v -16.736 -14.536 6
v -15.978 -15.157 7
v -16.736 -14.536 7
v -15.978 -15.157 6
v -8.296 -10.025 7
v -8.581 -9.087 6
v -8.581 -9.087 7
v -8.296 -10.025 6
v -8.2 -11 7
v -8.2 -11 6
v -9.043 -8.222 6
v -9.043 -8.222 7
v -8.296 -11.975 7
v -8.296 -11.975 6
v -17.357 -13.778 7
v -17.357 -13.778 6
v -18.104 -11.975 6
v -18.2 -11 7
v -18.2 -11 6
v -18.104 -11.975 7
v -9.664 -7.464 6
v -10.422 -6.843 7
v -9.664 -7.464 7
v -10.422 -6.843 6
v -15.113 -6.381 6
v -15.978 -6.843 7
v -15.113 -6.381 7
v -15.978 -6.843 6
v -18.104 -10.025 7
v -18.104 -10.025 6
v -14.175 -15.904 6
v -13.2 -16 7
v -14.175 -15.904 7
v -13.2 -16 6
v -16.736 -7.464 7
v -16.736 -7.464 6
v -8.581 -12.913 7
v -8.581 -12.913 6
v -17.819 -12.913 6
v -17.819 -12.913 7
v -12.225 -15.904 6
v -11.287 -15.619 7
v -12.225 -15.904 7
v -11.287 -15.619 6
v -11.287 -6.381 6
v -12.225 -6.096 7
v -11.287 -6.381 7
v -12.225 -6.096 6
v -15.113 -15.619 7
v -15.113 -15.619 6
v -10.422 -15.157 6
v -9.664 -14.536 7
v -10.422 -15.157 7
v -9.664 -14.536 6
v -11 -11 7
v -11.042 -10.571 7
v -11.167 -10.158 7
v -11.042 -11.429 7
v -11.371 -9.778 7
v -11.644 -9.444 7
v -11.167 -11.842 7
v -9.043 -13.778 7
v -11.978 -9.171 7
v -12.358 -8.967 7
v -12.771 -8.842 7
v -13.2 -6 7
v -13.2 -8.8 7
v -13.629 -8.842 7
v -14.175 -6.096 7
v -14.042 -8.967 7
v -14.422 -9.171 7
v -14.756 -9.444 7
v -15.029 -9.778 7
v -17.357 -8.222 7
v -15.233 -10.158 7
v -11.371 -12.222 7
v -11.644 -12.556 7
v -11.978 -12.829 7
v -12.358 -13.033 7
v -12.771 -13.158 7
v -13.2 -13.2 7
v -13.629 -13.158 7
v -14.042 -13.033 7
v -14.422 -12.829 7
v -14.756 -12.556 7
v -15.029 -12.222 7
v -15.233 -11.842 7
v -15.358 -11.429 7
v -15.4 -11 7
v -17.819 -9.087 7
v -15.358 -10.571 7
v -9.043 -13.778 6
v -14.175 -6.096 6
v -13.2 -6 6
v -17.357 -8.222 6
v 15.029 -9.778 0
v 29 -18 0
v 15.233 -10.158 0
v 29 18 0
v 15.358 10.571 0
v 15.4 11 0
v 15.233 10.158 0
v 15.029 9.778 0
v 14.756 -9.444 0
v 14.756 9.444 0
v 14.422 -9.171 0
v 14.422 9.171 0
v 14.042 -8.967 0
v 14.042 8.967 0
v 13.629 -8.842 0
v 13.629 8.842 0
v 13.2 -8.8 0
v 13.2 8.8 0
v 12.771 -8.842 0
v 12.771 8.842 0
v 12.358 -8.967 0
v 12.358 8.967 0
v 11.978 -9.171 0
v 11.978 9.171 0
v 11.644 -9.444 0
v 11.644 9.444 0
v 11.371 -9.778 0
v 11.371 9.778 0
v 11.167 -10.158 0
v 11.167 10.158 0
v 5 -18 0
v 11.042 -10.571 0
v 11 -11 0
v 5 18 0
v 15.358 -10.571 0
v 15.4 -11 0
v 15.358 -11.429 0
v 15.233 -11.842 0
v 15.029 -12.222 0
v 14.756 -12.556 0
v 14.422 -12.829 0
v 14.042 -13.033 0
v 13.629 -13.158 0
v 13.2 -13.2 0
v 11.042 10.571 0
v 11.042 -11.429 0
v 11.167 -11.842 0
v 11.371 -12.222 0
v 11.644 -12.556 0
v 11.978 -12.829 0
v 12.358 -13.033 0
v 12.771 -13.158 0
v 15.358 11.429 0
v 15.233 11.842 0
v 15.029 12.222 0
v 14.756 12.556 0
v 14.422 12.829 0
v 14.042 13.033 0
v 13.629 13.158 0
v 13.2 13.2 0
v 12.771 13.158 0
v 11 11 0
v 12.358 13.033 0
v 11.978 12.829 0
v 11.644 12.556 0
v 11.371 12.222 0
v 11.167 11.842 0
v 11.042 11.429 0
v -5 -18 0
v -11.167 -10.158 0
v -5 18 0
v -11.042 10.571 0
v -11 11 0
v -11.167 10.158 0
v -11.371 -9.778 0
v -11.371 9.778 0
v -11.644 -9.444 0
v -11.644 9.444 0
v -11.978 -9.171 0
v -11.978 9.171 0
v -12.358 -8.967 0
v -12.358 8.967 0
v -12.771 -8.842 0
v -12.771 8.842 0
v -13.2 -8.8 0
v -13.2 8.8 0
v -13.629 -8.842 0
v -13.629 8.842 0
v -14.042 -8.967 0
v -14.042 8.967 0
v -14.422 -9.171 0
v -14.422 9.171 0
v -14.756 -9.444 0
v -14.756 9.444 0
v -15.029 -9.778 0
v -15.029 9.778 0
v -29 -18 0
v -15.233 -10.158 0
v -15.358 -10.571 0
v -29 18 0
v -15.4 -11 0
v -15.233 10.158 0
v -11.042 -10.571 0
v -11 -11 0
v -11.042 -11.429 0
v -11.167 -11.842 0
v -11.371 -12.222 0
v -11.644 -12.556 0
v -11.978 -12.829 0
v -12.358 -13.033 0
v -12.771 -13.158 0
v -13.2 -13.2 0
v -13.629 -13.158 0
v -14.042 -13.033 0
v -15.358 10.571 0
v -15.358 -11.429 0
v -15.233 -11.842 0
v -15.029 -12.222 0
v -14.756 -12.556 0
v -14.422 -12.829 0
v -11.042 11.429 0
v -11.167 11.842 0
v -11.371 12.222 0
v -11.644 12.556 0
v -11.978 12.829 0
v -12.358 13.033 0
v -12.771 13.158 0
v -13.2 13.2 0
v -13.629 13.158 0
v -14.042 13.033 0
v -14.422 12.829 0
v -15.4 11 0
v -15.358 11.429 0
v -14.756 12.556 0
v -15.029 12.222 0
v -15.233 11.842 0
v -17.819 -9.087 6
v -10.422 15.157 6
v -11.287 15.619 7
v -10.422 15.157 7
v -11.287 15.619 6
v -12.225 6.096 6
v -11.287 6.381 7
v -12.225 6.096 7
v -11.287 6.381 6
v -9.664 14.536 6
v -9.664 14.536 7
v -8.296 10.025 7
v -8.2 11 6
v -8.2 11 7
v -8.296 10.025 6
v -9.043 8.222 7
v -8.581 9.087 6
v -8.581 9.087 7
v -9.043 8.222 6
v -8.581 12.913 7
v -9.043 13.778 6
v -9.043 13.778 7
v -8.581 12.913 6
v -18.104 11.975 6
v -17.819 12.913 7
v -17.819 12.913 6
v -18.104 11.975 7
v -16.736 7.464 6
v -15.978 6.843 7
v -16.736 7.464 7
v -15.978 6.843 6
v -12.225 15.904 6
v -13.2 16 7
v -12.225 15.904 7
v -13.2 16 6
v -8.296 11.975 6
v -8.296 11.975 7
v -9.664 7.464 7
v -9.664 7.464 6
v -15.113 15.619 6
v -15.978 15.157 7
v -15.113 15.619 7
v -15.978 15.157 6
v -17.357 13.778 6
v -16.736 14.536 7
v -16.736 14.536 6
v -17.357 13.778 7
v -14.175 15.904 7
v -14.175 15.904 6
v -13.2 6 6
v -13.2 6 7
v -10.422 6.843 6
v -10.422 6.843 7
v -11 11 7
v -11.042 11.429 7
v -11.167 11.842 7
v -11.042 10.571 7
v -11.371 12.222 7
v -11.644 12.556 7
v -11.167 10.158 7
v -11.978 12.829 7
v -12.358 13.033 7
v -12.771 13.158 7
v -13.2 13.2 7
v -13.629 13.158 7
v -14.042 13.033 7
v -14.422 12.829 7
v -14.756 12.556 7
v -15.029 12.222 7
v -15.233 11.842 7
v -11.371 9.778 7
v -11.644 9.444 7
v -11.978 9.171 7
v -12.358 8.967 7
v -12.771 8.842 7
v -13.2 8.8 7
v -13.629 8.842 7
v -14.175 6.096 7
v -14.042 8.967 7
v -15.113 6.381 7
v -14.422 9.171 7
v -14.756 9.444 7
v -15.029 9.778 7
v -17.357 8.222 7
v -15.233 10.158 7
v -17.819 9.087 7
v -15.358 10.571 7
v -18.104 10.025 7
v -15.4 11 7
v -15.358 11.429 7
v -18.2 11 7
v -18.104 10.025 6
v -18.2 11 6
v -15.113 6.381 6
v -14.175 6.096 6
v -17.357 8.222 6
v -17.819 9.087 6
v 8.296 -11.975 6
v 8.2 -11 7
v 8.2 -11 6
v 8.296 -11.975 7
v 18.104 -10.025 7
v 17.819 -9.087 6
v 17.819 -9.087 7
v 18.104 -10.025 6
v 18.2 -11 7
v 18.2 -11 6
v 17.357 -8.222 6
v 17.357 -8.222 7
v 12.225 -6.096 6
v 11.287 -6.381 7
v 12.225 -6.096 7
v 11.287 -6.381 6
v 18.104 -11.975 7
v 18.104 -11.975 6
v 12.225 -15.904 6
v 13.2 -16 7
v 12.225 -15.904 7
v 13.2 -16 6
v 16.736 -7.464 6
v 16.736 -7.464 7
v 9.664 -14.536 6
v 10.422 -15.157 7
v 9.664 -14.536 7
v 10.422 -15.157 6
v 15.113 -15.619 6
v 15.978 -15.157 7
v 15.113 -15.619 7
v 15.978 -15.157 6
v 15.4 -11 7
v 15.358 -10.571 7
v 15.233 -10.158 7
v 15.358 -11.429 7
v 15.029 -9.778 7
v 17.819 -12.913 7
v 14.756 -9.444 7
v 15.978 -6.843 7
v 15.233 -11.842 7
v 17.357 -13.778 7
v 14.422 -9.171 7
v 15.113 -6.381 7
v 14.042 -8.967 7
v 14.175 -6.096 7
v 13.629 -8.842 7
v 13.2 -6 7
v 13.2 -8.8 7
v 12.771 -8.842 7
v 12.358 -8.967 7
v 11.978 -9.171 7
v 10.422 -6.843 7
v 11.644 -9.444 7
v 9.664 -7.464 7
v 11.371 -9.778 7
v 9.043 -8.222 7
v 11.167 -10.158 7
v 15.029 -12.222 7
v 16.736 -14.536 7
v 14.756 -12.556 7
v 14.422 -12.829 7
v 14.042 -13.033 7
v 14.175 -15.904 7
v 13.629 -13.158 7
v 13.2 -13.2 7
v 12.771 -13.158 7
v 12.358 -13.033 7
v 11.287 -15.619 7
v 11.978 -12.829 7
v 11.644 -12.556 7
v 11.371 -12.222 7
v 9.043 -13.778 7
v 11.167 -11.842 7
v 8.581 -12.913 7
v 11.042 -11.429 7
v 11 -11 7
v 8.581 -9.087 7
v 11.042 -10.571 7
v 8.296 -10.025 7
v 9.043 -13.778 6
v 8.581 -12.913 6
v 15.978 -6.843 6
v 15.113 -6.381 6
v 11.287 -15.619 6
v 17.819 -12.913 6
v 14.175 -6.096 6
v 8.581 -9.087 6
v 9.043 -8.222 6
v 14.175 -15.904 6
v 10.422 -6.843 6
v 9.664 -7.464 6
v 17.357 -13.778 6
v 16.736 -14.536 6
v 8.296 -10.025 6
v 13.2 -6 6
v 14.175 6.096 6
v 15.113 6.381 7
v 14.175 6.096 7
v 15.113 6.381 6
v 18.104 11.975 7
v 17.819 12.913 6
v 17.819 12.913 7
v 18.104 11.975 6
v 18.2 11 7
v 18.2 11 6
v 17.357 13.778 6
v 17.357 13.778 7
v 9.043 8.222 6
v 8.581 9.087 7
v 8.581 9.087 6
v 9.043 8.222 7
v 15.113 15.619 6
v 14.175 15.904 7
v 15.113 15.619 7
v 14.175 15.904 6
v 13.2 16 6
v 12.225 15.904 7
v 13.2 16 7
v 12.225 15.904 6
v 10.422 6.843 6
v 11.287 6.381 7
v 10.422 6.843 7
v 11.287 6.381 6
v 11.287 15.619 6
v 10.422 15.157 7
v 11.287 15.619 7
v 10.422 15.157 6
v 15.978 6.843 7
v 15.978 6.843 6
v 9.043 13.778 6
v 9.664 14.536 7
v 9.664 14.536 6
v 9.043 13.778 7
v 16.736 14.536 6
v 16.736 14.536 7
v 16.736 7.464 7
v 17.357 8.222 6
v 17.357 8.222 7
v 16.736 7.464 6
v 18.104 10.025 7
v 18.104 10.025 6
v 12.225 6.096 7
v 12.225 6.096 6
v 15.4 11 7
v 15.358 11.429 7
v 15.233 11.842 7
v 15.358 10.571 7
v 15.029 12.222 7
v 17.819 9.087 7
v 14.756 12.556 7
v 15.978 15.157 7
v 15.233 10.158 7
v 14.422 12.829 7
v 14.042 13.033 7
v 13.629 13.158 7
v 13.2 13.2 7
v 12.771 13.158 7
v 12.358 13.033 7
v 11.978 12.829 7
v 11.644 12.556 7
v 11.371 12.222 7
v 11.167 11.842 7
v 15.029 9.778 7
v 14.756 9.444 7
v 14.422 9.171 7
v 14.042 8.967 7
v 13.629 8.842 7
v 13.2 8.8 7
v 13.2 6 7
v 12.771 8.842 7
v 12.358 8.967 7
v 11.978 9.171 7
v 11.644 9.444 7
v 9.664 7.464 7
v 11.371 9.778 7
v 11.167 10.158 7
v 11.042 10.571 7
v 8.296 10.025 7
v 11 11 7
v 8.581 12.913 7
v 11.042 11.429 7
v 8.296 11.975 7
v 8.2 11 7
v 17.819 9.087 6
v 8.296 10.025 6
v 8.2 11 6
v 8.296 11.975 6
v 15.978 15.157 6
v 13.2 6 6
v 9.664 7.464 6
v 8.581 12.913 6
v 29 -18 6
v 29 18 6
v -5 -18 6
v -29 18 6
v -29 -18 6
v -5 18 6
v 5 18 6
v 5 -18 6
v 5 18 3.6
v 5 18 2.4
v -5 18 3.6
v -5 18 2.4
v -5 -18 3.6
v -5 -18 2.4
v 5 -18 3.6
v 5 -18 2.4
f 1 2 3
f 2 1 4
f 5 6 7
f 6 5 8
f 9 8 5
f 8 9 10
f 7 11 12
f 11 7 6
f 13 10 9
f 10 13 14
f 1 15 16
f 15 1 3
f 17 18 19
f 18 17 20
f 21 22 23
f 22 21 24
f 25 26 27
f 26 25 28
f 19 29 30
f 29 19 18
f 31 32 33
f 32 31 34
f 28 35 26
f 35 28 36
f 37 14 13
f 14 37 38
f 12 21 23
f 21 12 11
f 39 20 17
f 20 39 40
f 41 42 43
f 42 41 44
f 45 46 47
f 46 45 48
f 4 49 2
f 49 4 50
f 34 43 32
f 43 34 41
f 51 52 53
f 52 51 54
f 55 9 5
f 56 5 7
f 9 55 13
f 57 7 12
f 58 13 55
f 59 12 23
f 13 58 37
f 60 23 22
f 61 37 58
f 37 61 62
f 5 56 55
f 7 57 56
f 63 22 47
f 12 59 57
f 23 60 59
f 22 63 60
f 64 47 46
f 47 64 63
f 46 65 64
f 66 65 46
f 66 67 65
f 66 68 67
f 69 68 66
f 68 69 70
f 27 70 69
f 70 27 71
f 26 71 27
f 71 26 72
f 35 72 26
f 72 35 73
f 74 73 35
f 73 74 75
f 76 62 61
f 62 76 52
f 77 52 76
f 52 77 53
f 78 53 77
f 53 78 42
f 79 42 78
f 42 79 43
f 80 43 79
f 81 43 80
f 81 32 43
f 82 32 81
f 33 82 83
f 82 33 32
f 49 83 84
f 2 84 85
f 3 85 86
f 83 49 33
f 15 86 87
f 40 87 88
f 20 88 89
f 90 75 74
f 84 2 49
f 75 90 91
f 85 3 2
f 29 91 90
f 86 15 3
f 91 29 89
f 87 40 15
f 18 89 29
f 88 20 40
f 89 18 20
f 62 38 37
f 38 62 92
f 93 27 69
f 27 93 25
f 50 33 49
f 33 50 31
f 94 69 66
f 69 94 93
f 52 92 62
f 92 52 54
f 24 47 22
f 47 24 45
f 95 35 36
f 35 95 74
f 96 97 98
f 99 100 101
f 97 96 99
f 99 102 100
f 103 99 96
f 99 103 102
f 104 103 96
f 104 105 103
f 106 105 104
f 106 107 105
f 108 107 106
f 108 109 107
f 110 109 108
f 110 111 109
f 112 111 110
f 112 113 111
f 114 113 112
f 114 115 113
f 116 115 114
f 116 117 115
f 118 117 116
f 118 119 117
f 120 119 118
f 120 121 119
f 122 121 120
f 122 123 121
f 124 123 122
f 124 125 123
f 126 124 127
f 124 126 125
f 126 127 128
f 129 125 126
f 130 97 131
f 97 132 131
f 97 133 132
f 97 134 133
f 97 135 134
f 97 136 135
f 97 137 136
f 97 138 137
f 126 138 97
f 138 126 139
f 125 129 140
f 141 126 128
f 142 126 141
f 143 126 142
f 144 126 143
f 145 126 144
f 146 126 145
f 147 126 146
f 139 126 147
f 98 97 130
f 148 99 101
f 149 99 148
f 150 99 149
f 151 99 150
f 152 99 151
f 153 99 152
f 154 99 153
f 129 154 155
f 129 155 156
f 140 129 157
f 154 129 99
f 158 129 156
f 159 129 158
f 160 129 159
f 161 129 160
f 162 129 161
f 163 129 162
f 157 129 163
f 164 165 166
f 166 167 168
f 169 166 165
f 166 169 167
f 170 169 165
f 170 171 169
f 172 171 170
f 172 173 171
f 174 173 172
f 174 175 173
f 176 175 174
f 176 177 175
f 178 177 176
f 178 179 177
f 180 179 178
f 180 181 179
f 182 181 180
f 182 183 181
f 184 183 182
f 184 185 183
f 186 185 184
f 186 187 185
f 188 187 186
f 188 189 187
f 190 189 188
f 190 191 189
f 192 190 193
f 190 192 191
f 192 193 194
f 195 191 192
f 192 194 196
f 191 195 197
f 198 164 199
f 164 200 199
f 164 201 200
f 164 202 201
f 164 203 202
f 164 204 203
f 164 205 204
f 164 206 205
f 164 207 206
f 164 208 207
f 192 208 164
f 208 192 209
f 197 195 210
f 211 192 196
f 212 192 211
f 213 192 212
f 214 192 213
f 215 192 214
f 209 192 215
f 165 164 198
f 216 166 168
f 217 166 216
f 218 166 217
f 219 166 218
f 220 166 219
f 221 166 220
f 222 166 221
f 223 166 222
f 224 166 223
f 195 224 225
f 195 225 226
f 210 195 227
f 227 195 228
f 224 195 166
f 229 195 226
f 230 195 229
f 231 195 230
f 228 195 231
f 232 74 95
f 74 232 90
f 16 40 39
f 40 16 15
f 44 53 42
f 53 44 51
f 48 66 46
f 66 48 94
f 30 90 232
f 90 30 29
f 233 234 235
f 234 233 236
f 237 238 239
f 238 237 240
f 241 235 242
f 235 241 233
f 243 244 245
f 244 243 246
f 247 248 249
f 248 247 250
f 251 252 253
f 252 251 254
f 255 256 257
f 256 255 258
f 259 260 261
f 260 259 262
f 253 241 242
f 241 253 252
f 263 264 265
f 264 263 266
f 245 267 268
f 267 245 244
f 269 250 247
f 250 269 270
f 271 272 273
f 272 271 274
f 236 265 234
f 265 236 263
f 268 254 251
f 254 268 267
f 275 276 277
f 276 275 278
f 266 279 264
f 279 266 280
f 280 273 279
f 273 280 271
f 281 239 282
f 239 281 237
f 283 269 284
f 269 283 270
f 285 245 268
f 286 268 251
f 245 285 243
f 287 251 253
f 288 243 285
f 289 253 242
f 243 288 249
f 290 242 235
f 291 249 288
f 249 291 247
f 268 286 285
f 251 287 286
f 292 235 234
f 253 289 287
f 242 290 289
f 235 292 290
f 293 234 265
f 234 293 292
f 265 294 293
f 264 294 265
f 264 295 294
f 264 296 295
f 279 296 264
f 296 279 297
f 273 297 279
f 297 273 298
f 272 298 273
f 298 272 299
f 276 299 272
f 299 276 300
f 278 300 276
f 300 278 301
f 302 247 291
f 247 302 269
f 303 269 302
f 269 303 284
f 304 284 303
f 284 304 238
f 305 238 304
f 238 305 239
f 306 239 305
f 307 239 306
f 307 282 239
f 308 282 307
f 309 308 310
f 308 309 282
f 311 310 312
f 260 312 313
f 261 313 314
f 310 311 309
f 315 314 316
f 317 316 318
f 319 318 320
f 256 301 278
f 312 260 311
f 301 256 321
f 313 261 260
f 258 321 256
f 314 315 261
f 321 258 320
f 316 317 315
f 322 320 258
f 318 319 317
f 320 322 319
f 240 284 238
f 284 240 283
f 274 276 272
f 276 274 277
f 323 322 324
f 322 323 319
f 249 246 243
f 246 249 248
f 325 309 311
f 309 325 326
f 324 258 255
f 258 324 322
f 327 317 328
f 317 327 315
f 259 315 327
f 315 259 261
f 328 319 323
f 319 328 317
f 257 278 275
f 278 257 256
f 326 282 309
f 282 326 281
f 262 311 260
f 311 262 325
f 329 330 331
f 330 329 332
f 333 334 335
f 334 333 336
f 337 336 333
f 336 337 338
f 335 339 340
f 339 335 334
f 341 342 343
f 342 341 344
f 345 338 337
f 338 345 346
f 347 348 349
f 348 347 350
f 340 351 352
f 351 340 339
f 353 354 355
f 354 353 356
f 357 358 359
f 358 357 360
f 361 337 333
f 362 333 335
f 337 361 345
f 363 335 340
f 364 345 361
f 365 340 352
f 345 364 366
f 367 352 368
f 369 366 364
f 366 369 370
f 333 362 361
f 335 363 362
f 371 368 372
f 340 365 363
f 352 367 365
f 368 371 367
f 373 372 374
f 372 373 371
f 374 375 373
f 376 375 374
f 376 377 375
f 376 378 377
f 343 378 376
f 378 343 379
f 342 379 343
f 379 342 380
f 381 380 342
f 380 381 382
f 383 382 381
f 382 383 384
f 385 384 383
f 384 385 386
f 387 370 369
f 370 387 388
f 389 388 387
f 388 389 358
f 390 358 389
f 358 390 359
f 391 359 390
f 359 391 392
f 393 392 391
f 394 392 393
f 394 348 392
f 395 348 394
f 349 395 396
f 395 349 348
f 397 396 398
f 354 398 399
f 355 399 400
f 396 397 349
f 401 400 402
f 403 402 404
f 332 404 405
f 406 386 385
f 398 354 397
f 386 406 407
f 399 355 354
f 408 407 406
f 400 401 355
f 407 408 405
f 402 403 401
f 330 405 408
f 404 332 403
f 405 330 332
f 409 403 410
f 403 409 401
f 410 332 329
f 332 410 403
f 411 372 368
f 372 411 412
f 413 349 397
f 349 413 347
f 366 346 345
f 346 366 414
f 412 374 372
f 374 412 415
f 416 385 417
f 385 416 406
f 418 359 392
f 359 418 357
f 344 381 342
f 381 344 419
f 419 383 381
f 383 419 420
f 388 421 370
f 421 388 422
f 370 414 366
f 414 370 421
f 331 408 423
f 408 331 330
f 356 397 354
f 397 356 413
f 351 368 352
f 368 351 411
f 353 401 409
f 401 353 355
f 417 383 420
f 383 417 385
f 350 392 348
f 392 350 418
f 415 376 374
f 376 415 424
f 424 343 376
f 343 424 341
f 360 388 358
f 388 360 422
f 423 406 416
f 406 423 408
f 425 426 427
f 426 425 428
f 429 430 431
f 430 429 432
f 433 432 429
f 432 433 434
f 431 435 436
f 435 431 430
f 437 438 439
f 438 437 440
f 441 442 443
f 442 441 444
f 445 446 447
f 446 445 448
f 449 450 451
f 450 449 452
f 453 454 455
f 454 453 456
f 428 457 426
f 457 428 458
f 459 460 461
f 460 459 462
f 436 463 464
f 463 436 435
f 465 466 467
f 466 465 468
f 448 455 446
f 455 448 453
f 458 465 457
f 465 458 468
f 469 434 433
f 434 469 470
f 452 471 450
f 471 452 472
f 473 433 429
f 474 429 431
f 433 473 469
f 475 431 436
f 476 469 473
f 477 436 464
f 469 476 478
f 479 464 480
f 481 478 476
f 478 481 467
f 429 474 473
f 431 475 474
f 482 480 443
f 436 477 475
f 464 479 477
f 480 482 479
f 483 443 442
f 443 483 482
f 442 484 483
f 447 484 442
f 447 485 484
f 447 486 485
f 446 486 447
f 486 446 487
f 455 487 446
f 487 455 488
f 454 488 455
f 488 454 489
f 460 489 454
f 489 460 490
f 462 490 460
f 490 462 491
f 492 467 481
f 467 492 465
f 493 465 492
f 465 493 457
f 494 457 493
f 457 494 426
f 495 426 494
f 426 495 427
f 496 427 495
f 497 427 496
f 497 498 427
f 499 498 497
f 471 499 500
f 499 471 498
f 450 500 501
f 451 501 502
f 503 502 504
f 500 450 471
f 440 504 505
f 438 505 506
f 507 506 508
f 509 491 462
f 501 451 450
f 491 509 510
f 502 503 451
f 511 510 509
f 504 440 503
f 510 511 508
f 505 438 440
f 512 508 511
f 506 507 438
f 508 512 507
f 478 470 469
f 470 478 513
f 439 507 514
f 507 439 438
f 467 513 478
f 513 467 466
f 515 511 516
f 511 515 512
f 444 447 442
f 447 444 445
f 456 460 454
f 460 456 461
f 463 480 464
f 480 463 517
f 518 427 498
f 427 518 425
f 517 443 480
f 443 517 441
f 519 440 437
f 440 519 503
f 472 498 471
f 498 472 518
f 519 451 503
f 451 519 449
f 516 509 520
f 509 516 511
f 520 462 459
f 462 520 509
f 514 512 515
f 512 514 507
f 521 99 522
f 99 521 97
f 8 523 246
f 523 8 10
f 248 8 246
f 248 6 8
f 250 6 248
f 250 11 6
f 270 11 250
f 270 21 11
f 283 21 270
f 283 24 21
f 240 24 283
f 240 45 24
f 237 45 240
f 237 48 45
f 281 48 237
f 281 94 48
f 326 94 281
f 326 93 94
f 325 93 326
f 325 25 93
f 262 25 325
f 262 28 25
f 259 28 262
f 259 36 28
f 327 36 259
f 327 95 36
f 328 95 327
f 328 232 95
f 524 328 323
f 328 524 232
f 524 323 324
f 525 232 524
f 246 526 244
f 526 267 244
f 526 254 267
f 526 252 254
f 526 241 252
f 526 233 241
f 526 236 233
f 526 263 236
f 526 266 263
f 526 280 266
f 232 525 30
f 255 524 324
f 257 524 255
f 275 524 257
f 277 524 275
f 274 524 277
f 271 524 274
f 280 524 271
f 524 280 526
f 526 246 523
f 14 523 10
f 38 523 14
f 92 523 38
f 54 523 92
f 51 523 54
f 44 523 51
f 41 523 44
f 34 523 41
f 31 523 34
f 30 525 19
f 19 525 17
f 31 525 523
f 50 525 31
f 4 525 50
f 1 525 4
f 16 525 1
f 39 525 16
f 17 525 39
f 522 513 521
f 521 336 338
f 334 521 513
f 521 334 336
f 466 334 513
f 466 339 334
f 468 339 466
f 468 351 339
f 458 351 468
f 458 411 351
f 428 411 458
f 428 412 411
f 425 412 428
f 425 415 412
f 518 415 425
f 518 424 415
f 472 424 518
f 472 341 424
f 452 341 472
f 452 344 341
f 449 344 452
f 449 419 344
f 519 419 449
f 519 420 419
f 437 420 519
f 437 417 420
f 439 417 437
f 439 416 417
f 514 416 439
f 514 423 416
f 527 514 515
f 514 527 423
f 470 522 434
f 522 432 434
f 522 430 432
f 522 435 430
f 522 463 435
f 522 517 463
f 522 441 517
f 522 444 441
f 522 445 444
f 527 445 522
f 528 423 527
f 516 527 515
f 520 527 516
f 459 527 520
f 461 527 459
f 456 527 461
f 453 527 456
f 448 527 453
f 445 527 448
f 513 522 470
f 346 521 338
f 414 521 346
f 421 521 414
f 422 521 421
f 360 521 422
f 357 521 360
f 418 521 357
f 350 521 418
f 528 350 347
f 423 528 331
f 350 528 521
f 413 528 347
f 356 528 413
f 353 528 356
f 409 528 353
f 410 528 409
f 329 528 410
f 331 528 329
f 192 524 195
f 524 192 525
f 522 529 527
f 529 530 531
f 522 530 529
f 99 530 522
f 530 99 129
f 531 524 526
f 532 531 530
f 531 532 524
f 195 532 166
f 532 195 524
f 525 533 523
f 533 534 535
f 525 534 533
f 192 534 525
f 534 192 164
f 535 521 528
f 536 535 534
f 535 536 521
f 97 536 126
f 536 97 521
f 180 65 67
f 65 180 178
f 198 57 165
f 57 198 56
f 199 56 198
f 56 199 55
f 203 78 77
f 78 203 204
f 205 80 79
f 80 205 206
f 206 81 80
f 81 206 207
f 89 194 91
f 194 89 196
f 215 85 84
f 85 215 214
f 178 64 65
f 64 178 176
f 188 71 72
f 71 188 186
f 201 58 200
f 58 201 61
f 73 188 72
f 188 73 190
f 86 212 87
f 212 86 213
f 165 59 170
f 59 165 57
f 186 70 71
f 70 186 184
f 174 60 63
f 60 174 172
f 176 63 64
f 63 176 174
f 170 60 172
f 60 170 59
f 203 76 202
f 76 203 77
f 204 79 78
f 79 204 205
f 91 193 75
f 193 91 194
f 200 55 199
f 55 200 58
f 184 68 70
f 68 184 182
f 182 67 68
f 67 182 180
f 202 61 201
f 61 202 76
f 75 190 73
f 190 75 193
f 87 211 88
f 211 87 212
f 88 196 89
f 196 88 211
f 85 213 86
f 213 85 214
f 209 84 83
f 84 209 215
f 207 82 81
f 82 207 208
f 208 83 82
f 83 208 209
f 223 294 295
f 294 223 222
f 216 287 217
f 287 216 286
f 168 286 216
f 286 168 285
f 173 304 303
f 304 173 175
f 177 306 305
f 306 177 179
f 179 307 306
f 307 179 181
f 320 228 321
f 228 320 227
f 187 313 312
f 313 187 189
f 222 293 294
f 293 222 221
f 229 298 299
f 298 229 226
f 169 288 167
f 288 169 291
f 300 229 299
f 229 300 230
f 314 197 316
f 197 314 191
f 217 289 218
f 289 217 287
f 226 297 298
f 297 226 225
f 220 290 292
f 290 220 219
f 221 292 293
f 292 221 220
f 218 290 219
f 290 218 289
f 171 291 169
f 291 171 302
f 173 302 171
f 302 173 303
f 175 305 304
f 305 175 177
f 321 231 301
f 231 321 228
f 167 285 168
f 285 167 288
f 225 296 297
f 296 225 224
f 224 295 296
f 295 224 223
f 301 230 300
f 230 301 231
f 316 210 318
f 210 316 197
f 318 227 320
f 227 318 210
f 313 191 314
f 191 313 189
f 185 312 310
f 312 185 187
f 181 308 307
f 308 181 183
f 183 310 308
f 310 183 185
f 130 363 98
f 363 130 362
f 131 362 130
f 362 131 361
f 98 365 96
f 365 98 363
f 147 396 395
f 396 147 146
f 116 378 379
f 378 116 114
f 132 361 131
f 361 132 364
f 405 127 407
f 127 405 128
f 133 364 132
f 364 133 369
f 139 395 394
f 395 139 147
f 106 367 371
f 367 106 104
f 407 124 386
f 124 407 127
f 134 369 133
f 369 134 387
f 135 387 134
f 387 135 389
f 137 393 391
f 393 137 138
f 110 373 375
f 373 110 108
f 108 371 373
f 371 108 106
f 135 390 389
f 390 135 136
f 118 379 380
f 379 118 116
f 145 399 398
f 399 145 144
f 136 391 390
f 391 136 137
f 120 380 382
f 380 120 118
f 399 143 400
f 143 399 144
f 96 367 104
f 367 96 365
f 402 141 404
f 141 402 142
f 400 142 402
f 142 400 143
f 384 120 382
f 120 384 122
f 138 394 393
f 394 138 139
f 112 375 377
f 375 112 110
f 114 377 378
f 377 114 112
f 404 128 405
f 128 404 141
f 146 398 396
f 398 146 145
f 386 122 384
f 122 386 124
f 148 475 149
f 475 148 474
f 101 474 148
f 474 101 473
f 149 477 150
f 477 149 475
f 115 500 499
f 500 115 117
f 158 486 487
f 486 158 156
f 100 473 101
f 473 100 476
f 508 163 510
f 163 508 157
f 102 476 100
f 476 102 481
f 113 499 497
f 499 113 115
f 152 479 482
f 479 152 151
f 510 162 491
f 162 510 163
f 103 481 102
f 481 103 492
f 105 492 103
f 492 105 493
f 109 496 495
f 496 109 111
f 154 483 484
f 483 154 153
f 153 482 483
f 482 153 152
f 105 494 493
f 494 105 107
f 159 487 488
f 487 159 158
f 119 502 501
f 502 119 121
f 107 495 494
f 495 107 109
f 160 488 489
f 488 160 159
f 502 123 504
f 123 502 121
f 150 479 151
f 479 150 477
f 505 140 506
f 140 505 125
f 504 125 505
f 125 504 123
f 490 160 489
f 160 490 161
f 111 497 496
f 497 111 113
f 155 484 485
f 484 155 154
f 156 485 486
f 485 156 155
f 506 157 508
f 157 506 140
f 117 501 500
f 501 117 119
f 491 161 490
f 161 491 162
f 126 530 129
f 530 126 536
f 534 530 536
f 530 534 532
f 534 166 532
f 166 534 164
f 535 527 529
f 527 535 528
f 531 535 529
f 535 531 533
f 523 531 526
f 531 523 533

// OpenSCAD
$fn = 32;

// ----------------------------------------------------------------------
// Living hinge: 58 x 36 mm plates, 1.2 mm flexible web
// ----------------------------------------------------------------------

// --- parameters (mm) ---
plate_len = 24;           // plate length outside the web
plate_w = 36;             // plate width
thick = 6;                // plate thickness
web_half = 5;             // half width of the flex band
web_t = 1.2;              // flexible web thickness
web_z = 2.4;              // web position inside the thickness
boss_d = 10;              // screw boss diameter
boss_h = 7;               // screw boss height
boss_x = 13.2;            // screw boss distance from the web
screw_d = 4.4;            // screw hole

difference() {
  union() {
    /* one flat strip, later thinned at the middle */
    translate([-29, -18, 0]) cube([58, 36, 6]);
    /* screw bosses, sunk 0.5 mm into the plates */
    for (sx = [-13.2, 13.2]) {
      for (sy = [-11, 11]) {
        translate([sx, sy, 0]) cylinder(h = boss_h, d = boss_d);
      }
    }
  }
  /* channel from below: leaves the web on top of it */
  translate([-5, -20.5, -2.5]) cube([10, 41, 4.9]);
  /* channel from above: thins the web down to web_t */
  translate([-5, -20.5, 3.6]) cube([10, 41, 4.9]);
  /* screw holes through the bosses */
  for (sx = [-13.2, 13.2]) {
    for (sy = [-11, 11]) {
      translate([sx, sy, -2.5]) cylinder(h = boss_h + 5, d = screw_d);
    }
  }
}
